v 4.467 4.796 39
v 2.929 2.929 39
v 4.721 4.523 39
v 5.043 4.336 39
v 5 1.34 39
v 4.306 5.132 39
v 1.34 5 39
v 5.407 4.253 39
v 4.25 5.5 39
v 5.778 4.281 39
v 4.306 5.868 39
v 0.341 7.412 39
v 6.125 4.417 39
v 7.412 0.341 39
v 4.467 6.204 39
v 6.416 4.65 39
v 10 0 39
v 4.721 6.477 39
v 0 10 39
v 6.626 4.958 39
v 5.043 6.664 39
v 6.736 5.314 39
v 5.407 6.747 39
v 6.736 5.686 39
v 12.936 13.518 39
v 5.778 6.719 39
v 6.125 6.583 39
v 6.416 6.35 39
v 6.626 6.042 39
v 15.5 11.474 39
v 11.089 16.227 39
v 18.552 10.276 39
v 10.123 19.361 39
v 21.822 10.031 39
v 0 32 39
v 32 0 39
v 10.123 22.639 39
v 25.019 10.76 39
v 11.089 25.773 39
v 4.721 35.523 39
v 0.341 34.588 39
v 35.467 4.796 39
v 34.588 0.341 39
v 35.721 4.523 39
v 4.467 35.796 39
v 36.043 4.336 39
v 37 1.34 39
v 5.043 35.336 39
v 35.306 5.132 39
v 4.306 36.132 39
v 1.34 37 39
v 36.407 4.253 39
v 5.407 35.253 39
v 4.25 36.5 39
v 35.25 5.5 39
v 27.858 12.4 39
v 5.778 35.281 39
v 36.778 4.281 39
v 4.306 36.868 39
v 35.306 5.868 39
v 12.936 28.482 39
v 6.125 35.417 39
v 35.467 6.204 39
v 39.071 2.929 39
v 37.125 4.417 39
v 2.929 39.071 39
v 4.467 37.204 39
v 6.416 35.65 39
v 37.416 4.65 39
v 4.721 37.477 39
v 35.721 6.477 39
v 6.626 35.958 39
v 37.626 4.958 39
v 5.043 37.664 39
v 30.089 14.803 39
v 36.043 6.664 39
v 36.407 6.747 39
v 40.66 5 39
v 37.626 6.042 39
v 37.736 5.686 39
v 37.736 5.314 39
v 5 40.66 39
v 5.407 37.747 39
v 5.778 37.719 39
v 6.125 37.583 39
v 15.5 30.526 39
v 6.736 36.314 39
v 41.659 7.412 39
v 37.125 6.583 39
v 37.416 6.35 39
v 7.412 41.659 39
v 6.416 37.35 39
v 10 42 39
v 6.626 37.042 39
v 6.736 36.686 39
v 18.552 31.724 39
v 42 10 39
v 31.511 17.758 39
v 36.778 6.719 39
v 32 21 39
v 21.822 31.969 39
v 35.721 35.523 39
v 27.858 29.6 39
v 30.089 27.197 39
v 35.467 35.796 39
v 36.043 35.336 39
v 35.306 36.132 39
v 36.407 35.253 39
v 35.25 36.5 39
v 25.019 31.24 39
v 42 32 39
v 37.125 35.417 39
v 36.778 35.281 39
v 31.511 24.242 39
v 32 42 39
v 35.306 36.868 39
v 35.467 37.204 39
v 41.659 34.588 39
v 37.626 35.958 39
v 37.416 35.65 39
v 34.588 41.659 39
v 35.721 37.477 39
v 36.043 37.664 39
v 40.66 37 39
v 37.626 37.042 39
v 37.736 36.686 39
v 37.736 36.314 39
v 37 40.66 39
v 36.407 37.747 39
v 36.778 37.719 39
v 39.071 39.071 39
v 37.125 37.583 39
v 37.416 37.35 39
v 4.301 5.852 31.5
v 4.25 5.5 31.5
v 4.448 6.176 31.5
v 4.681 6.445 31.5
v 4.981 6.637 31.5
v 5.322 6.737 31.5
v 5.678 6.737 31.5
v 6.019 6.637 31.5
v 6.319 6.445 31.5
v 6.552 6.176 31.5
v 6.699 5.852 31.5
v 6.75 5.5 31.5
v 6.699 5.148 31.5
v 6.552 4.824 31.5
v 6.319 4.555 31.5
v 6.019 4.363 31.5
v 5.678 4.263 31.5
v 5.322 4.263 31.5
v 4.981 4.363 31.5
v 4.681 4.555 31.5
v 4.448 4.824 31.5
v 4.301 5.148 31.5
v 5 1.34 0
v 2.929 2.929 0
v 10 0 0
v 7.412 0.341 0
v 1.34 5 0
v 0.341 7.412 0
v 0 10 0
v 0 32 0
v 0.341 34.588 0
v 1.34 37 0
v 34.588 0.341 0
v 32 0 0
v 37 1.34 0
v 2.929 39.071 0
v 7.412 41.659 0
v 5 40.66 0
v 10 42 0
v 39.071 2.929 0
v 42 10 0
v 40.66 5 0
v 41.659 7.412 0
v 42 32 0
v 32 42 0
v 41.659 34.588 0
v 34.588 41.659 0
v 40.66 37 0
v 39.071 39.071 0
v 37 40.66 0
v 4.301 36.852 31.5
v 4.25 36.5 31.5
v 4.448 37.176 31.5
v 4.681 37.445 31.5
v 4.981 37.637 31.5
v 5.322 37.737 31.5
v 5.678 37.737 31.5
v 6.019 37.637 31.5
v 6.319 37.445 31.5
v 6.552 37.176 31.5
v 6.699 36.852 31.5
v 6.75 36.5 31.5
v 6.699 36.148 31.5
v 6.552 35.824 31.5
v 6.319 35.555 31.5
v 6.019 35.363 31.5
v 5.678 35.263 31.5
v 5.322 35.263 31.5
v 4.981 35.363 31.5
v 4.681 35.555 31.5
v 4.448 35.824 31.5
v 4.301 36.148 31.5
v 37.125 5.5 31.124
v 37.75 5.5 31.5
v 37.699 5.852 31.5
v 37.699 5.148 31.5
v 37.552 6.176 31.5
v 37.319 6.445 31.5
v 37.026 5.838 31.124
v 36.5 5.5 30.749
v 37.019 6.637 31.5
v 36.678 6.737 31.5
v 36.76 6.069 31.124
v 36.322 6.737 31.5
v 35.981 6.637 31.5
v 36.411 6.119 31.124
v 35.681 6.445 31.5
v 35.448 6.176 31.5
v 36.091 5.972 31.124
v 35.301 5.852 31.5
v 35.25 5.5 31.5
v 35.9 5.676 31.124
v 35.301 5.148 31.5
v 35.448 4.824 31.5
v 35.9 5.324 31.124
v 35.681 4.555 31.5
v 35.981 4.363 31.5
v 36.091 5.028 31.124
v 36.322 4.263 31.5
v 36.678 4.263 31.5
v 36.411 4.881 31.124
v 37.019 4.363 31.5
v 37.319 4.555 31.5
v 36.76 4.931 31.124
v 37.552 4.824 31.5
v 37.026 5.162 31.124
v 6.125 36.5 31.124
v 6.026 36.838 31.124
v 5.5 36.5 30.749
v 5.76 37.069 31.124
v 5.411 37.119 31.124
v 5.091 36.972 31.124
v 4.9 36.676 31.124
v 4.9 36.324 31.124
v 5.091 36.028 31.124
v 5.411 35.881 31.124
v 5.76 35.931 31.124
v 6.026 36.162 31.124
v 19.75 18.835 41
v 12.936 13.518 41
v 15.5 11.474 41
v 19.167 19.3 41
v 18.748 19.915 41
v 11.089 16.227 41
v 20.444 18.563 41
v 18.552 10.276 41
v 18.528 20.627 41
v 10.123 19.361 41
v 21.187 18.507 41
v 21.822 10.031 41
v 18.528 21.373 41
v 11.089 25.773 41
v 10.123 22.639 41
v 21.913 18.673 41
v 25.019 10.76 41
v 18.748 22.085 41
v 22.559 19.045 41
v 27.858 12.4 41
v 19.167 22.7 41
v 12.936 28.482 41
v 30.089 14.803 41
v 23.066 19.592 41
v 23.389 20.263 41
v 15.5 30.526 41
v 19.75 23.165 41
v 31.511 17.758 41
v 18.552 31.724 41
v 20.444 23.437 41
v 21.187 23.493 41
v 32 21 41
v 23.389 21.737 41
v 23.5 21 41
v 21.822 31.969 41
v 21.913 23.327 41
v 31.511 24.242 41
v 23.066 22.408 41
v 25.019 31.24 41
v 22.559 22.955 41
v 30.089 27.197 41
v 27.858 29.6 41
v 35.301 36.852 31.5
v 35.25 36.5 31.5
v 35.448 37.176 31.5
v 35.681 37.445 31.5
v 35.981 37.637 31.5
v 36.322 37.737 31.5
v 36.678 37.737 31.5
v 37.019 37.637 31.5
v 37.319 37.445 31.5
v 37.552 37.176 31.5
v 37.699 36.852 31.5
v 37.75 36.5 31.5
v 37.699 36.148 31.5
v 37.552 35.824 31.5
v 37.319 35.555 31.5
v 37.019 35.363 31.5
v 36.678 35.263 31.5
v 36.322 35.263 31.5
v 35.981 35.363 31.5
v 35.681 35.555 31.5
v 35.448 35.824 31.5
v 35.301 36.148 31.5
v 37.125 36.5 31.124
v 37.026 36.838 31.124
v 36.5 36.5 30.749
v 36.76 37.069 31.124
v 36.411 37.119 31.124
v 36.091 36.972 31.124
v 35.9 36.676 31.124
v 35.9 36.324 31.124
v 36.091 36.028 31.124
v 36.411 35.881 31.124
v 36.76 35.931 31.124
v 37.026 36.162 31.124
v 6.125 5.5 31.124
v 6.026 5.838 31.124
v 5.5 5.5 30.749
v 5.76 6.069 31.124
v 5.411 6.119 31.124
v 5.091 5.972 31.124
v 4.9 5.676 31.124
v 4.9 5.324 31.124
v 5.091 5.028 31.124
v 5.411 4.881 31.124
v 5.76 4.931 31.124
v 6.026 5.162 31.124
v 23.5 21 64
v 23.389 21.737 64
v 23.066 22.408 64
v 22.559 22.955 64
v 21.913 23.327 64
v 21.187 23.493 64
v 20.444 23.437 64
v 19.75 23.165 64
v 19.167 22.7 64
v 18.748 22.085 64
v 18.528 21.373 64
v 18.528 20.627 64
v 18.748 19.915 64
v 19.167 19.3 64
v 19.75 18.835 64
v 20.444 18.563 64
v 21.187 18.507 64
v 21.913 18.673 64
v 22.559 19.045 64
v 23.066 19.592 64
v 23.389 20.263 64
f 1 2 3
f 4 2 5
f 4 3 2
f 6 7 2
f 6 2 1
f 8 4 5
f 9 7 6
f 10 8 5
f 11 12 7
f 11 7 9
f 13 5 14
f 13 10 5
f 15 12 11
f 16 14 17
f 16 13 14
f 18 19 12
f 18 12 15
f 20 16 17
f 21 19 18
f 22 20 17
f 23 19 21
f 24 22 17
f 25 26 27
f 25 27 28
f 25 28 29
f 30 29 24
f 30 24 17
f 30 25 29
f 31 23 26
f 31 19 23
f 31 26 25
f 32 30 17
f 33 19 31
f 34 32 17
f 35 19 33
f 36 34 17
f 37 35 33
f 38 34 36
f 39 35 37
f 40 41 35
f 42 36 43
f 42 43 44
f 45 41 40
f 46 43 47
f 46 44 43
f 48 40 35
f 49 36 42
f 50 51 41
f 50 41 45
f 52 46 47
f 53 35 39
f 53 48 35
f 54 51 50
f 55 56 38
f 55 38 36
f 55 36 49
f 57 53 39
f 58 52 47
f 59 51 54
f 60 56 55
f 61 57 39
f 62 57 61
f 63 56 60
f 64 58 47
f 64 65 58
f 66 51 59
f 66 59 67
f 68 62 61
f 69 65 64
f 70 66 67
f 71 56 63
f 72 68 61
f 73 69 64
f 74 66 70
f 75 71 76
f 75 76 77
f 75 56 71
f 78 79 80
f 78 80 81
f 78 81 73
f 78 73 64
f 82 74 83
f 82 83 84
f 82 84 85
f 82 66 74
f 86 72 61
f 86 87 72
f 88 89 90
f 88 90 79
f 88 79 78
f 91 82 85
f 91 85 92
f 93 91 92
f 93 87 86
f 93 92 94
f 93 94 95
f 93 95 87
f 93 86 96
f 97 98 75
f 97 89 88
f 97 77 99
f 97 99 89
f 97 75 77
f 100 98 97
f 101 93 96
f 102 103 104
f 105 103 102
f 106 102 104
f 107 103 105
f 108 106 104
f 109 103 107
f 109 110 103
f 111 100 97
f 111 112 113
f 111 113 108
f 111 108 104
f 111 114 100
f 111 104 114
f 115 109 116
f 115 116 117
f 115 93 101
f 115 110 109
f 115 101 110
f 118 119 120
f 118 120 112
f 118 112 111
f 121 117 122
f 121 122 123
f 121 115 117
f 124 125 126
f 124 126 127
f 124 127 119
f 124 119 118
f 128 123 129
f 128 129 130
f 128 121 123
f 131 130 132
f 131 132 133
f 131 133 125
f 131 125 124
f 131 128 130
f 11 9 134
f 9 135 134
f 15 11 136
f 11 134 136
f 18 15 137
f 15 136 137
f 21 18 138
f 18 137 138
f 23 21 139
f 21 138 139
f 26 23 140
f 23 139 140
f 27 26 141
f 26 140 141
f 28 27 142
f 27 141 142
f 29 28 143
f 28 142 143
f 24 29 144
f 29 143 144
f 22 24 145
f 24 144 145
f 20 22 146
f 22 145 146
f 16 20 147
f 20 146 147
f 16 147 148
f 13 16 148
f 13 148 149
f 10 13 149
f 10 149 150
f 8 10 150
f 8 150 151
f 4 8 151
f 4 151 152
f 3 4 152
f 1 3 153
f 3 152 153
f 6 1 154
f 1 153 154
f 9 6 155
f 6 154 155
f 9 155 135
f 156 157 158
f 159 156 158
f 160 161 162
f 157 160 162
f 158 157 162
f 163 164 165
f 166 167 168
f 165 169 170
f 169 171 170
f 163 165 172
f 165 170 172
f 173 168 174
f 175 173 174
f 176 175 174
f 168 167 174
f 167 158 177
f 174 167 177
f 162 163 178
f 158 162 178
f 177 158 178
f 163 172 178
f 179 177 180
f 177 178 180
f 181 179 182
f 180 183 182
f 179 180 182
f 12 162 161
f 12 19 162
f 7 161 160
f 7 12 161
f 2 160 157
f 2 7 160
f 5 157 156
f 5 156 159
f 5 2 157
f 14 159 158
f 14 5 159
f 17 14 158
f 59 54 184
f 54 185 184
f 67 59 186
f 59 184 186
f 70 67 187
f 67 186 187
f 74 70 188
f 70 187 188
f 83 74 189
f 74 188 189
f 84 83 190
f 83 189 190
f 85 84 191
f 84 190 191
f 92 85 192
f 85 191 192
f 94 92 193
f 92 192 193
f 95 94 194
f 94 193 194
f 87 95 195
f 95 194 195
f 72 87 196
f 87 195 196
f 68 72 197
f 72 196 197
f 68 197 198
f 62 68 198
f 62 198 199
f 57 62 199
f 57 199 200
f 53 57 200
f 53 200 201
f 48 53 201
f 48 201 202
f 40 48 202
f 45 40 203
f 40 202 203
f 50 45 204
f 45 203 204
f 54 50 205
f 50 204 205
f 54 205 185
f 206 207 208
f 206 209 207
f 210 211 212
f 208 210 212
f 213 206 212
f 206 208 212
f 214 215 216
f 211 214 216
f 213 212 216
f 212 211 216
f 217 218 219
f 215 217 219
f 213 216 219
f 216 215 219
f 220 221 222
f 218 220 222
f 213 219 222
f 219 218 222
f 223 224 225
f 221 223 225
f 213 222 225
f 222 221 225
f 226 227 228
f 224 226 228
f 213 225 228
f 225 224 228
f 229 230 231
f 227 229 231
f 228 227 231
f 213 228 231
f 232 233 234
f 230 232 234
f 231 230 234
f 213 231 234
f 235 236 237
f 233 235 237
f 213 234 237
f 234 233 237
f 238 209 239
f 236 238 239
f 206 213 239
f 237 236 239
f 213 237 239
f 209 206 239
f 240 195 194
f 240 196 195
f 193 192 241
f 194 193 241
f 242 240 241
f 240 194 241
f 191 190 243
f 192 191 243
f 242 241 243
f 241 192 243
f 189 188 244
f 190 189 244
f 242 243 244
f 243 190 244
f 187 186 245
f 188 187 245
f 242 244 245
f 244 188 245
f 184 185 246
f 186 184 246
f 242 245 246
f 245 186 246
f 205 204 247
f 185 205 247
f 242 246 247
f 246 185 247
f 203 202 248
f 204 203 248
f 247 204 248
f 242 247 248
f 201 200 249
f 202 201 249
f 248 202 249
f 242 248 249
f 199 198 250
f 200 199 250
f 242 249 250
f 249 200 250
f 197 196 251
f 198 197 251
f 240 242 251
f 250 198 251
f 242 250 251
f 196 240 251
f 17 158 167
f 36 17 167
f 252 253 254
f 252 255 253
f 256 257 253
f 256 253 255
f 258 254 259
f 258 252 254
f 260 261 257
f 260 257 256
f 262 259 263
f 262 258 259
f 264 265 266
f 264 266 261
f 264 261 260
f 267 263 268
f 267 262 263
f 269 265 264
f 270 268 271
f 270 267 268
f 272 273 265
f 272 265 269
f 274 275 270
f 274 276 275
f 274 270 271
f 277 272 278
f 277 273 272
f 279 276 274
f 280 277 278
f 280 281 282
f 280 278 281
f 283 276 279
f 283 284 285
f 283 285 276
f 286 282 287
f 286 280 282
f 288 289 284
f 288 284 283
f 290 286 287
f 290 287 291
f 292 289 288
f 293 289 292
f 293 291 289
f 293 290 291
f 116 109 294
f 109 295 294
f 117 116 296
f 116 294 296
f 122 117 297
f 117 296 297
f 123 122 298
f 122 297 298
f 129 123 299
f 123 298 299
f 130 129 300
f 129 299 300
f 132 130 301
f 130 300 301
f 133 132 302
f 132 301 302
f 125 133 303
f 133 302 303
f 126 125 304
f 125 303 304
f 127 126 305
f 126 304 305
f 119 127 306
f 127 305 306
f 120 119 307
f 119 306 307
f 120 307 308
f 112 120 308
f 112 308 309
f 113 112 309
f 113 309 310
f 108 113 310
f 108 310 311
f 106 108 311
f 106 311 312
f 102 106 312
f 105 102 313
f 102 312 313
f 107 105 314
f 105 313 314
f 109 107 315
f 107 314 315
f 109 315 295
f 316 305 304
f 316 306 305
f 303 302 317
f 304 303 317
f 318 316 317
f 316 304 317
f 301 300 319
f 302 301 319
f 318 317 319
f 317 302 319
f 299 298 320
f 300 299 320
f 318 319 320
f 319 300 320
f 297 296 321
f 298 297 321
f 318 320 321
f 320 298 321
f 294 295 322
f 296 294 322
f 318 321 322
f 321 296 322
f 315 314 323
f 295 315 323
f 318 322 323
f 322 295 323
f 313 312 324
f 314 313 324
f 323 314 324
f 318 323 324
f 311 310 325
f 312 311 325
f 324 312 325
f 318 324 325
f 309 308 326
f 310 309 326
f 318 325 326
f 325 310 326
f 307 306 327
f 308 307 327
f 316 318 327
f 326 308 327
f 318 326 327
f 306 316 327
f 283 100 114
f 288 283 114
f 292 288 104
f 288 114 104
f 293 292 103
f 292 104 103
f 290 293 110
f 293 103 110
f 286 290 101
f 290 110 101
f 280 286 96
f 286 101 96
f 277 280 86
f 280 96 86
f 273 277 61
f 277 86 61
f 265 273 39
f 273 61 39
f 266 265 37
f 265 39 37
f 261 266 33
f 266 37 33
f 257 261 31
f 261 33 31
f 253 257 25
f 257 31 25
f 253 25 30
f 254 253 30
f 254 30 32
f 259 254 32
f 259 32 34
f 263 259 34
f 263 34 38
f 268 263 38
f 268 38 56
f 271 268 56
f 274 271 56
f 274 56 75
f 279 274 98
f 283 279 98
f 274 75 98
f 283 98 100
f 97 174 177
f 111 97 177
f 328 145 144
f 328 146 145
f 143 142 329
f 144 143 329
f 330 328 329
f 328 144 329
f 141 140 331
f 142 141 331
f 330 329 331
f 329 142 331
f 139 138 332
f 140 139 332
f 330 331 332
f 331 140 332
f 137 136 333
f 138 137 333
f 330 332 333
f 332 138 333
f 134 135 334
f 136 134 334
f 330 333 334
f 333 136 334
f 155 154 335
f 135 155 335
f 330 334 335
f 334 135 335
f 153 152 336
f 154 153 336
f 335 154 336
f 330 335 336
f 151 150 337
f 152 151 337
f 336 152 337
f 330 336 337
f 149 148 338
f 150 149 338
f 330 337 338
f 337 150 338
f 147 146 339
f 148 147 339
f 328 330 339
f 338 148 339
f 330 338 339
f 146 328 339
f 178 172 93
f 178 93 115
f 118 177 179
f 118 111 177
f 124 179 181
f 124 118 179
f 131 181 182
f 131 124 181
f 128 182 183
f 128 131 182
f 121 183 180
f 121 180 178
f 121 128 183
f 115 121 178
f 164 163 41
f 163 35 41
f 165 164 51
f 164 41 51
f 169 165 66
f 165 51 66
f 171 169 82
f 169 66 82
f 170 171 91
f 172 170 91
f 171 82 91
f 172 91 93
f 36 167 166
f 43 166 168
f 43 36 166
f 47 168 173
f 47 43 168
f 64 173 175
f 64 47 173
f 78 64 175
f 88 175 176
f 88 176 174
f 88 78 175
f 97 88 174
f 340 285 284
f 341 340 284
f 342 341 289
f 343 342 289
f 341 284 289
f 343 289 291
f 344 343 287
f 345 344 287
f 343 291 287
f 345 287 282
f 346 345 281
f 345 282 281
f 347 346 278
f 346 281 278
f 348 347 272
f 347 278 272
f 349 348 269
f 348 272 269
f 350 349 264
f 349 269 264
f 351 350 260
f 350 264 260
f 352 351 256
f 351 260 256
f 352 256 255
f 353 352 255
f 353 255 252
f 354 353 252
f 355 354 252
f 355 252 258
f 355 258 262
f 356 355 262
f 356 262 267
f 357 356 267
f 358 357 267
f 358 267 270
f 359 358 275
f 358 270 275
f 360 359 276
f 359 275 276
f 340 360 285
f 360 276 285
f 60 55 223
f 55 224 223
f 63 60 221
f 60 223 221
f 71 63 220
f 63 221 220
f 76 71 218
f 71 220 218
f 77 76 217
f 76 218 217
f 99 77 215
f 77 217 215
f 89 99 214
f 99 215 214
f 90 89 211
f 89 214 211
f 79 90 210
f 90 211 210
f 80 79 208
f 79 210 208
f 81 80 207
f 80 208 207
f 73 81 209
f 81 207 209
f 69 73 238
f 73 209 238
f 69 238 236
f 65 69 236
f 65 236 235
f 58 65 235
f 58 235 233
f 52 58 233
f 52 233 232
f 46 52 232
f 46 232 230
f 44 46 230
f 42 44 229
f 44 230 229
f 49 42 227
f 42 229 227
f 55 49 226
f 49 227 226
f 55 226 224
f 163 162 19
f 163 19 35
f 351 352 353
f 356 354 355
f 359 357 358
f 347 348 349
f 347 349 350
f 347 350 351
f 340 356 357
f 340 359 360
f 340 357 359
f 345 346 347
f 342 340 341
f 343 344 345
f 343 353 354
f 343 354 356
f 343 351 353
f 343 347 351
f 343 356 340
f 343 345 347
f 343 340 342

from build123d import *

# Parameters (mm, degrees)
SKETCH_1_W             = 42
SKETCH_1_H             = 42
EXTRUDE_1_DEPTH        = 39
FILLET_1_R             = 10
HOLE_WIZARD_M3_1_D     = 2.5
HOLE_WIZARD_M3_1_DEPTH = 7.5
HOLE_WIZARD_M3_1_TIP   = 0.751075774
SKETCH_4_R             = 11
EXTRUDE_2_DEPTH        = 2
SKETCH_5_R             = 2.5
EXTRUDE_3_DEPTH        = 23


with BuildPart() as part:
    # 草图1 → 凸台-拉伸1 (new body)
    with BuildSketch(Plane.XY):
        with Locations((21, 21)):
            Rectangle(SKETCH_1_W, SKETCH_1_H)
    extrude(amount=EXTRUDE_1_DEPTH)

    # 圆角1
    fillet_1_edges = [part.edges().sort_by_distance(p)[0] for p in [
        (0, 42, 19.5),
        (42, 42, 19.5),
        (42, 0, 19.5),
        (0, 0, 19.5),
    ]]
    fillet(fillet_1_edges, radius=FILLET_1_R)

    # M3 螺纹孔1
    with Locations(Plane.XY.offset(39)):
        with Locations((5.5, 36.5), (36.5, 36.5), (36.5, 5.5), (5.5, 5.5)):
            Hole(HOLE_WIZARD_M3_1_D / 2, depth=HOLE_WIZARD_M3_1_DEPTH)
            with Locations((0, 0, -(HOLE_WIZARD_M3_1_DEPTH + HOLE_WIZARD_M3_1_TIP / 2))):  # 118° drill point
                Cone(0, HOLE_WIZARD_M3_1_D / 2, HOLE_WIZARD_M3_1_TIP, mode=Mode.SUBTRACT)

    # 草图4 → 凸台-拉伸2 (add)
    with BuildSketch(Plane.XY.offset(39)):
        with Locations((21, 21)):
            Circle(SKETCH_4_R)
    extrude(amount=EXTRUDE_2_DEPTH)

    # 草图5 → 凸台-拉伸3 (add)
    with BuildSketch(Plane.XY.offset(41)):
        with Locations((21, 21)):
            Circle(SKETCH_5_R)
    extrude(amount=EXTRUDE_3_DEPTH)


solid = part.part
